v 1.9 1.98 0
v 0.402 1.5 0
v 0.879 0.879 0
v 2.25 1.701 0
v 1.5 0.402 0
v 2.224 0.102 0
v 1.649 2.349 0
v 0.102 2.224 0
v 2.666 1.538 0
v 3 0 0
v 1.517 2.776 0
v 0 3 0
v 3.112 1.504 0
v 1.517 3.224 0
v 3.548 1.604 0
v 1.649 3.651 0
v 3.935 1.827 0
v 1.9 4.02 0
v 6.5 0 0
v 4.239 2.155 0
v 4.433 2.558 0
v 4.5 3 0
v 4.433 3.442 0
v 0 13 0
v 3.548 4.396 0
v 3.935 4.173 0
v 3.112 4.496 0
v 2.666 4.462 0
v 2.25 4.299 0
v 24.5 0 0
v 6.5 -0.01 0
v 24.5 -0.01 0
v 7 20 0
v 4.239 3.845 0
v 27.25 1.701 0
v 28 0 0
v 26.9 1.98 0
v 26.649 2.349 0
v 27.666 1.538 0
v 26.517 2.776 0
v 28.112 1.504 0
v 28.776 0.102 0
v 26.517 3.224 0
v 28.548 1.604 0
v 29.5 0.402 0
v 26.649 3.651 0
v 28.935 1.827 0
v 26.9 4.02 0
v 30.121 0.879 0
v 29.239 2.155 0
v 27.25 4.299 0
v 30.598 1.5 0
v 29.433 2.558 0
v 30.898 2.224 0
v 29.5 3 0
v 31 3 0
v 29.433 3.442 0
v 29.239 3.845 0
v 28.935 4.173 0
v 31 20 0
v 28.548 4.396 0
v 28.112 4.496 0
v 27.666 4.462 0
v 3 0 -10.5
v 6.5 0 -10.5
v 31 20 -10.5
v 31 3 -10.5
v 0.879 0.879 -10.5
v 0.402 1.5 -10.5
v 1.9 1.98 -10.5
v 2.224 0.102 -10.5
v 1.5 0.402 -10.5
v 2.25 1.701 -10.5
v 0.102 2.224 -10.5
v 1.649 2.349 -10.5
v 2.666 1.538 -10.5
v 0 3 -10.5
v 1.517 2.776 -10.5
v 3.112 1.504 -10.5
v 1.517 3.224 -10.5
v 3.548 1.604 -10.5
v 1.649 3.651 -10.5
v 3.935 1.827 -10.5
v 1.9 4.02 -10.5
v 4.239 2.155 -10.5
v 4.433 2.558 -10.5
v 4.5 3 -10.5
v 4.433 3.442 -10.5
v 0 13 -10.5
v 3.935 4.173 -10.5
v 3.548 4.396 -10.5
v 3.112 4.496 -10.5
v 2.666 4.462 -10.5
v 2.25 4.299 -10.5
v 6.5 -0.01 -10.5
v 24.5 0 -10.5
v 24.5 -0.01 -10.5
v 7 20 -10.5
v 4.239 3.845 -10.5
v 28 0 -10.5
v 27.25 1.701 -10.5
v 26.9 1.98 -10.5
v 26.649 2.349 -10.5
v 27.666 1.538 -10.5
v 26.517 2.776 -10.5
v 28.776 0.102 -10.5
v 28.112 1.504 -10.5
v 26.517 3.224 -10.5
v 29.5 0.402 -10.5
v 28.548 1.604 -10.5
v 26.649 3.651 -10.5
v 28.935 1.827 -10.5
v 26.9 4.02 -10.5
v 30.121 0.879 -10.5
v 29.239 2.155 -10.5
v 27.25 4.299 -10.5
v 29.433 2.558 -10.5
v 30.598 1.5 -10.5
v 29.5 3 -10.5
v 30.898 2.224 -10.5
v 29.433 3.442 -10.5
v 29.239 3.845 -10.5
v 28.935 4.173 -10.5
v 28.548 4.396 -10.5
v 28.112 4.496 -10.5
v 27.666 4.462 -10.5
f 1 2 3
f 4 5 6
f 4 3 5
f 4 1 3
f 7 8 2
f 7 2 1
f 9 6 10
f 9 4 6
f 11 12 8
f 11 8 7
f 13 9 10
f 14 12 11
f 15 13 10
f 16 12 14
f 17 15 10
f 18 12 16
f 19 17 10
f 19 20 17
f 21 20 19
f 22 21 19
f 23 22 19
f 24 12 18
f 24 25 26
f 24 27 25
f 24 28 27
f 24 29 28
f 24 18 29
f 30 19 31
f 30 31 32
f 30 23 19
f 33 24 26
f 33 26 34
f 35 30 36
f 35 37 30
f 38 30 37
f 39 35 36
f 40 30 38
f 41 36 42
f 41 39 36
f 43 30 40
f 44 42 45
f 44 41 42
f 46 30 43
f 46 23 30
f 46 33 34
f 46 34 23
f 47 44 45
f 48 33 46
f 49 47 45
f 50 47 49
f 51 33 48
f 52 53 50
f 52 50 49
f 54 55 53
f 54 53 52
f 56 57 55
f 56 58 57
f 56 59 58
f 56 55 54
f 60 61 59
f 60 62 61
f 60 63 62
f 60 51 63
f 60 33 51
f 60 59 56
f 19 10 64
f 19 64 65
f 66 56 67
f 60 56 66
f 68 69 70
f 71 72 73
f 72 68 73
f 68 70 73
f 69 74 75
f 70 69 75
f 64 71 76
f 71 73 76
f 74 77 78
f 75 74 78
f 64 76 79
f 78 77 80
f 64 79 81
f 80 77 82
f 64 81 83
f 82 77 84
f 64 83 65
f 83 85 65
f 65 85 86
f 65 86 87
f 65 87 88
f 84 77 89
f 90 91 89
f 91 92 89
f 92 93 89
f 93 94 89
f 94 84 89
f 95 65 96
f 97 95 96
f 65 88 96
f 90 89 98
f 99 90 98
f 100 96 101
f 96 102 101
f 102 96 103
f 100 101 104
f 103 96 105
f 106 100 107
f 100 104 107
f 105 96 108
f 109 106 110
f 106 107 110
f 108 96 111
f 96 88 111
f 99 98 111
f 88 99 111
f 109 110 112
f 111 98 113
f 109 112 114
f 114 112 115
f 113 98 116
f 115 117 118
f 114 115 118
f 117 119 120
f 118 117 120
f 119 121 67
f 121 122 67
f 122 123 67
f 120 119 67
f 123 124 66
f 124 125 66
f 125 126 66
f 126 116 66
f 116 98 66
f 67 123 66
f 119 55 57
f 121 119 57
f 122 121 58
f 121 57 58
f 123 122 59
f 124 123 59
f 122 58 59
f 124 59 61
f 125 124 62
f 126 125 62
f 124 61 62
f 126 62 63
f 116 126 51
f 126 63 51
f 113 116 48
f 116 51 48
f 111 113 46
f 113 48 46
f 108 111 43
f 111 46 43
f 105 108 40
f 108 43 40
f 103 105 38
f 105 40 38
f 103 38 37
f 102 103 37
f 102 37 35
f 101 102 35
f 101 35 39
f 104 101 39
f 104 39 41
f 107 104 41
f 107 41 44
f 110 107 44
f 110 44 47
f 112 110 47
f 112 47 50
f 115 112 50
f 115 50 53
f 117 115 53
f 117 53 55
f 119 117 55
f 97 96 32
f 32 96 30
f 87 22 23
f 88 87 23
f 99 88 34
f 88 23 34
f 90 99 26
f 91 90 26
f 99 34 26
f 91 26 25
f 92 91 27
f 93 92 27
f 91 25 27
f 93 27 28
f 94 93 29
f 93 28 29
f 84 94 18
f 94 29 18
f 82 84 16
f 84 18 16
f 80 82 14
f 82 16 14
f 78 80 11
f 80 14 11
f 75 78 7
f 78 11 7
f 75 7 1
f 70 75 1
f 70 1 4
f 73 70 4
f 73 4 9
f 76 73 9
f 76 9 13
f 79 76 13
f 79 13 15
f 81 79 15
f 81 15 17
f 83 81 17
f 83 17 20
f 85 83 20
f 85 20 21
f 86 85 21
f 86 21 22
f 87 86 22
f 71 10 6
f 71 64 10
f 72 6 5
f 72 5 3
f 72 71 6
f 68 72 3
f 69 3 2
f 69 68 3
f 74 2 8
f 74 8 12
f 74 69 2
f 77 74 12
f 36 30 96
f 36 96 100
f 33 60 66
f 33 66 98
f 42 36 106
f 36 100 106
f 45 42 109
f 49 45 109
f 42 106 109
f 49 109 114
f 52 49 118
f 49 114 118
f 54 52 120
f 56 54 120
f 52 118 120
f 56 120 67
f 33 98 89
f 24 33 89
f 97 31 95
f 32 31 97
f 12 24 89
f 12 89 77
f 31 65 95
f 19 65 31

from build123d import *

# Parameters (mm, degrees)
BOSS_EXTRU_1_DEPTH      = 10.5
ESQUISSE2_R             = 1.5
ENL_V_MAT_EXTRU_1_DEPTH = 39.356876828
CONG_1_R                = 3
ESQUISSE3_W             = 18
ESQUISSE3_H             = 10.5
BOSS_EXTRU_2_DEPTH      = 0.01


with BuildPart() as part:
    # Esquisse1 → Boss.-Extru.1 (new body)
    with BuildSketch(Plane.XY):
        Polygon((0, 0), (31, 0), (31, 20), (7, 20), (0, 13), align=None)
    extrude(amount=-BOSS_EXTRU_1_DEPTH)

    # Esquisse2 → Enlèv. mat.-Extru.1 (cut, through all)
    with BuildSketch(Plane.XY):
        with Locations((3, 3)):
            Circle(ESQUISSE2_R)
        with Locations((28, 3)):
            Circle(ESQUISSE2_R)
    extrude(amount=-ENL_V_MAT_EXTRU_1_DEPTH, mode=Mode.SUBTRACT)

    # Congé1
    cong_1_edges = [part.edges().sort_by_distance(p)[0] for p in [
        (31, 0, -5.25),
        (0, 0, -5.25),
    ]]
    fillet(cong_1_edges, radius=CONG_1_R)

    # Esquisse3 → Boss.-Extru.2 (add)
    with BuildSketch(Plane.XZ):
        with Locations((15.5, -5.25)):
            Rectangle(ESQUISSE3_W, ESQUISSE3_H)
    extrude(amount=BOSS_EXTRU_2_DEPTH)


solid = part.part
